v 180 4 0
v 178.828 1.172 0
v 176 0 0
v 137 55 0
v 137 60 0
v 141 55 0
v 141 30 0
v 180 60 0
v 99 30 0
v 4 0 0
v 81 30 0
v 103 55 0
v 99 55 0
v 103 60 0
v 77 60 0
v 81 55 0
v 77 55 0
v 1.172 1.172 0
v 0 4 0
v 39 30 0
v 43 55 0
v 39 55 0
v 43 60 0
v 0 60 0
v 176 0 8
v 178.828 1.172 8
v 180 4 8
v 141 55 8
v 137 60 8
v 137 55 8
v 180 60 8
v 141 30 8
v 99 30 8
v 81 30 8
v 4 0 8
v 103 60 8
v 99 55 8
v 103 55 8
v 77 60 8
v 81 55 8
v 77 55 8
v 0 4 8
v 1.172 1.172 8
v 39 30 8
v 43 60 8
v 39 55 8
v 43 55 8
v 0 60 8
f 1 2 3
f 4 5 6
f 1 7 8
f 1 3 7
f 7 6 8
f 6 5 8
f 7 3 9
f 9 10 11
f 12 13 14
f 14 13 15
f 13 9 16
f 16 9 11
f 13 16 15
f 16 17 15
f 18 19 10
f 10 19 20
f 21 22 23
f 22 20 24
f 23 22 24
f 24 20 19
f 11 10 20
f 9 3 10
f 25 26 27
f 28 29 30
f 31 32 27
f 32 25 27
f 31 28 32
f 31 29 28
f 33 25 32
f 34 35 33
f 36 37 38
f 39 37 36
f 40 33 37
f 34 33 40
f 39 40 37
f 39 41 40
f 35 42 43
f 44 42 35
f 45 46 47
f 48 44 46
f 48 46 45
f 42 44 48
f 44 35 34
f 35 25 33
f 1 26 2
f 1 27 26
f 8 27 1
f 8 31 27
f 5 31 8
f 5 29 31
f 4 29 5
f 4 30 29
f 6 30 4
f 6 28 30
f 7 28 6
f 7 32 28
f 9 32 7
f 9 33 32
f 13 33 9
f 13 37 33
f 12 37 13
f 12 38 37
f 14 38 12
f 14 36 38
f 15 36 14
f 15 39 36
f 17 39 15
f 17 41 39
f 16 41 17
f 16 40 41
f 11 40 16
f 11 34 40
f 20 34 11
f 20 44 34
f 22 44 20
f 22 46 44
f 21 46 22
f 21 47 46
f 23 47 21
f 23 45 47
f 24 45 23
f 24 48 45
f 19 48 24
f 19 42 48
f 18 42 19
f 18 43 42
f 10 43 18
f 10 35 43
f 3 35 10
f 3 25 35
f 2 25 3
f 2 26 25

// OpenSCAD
$fn = 32;

// ----------------------------------------------------------------------
// Oversize slot bar: 180 mm bar with 2 oversize windows
// ----------------------------------------------------------------------

// --- parameters (mm) ---
profile_height = 8;       // extrusion height
profile_points = 24;      // points of the closed outline

profile = [[0, 4], [1.172, 1.172], [4, 0], [176, 0], [178.828, 1.172], [180, 4], [180, 60], [137, 60], [137, 55], [141, 55], [141, 30], [99, 30], [99, 55], [103, 55], [103, 60], [77, 60], [77, 55], [81, 55], [81, 30], [39, 30], [39, 55], [43, 55], [43, 60], [0, 60]];  // single closed polygon, 24 points, counter clockwise

// --- the one profile operation ---
linear_extrude(height = profile_height) polygon(points = profile);
